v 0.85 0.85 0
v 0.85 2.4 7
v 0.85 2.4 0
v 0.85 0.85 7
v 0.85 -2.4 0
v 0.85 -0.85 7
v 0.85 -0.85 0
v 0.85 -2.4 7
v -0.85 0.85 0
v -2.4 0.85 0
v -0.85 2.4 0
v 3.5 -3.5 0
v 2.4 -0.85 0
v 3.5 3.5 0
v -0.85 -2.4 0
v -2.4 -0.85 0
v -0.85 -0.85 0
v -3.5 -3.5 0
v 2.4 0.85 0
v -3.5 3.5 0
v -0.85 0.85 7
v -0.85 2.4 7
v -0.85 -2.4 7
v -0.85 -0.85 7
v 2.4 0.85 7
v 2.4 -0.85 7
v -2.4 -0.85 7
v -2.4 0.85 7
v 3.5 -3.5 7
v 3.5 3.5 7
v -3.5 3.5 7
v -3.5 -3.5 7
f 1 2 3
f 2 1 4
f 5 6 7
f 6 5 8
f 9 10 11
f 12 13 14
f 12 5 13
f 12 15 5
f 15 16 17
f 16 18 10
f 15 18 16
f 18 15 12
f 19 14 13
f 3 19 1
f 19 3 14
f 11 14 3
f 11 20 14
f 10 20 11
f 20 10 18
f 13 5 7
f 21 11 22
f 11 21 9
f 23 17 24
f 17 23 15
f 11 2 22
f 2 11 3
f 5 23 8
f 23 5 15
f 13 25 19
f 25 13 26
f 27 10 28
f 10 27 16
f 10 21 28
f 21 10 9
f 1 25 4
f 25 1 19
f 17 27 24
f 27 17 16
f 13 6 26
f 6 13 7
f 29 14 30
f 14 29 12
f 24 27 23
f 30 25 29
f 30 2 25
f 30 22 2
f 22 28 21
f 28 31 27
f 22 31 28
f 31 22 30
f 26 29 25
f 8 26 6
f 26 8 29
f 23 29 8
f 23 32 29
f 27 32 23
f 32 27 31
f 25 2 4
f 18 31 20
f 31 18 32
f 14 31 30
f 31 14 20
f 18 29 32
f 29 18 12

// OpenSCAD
$fn=100;
u=1.6; // One lego unit
play=0.1; // Tolerance of holes
studr=3*0.5*u; // Radius of stud/pin
beamh=5*u;
beamw=5*u;

ZEROISH=0.000000000000001;

// Body of lego beam without holes
module beambody(length){
	translate([0,0,2.5*u])
	minkowski() {
		cube([ZEROISH,
				length*5*u-beamw,
				beamh],
			center=true);

		cylinder(ZEROISH,
			beamw/2,
			beamw/2);
	}
}

// Cutouts for stud/pin holes in beams
module studhole(length=1){
	cylinder(beamh*u, studr+play/2, studr+play/2);
	for (i = [0, beamh-0.5*u]) {
		translate([0,0,i]) cylinder(0.5*u, 3.5*0.5*u, 3.5*0.5*u);
	}
}


// Beam with holes
module beam(length) {
	difference(){
		translate([0,length*5*u/2,0])
			beambody(length=length);
		for (i = [0:length-1]) {
			translate([0,(2.5 + 5*i)*u,0]) studhole();
		}
	}
}

// L shaped beam
module lbeam(length=4, width=3) {
	translate([0,-4,0]) beam(length);
	rotate([0,0,90]) translate([0,-4,0]) beam(width);
}

// Axle
module axle(length=2, hole=false) {
	if (hole) {
		translate([0,0,length*beamw/2]) {
			cube([u + play, 4.7 + play, length*beamw], center=true);
			cube([4.7 + play, u + play, length*beamw], center=true);
		}
	}
	else {
		translate([0,0,length*beamw/2]) {
			cube([u, 4.7, length*beamw], center=true);
			cube([4.7, u, length*beamw], center=true);
		}
	}
}

// Cutout for axle holes
module axlehole(length) {
	axle(length,true);
}

difference(){
translate([0,0,3.5]) cube(7,center=true);
axlehole(3);
}
